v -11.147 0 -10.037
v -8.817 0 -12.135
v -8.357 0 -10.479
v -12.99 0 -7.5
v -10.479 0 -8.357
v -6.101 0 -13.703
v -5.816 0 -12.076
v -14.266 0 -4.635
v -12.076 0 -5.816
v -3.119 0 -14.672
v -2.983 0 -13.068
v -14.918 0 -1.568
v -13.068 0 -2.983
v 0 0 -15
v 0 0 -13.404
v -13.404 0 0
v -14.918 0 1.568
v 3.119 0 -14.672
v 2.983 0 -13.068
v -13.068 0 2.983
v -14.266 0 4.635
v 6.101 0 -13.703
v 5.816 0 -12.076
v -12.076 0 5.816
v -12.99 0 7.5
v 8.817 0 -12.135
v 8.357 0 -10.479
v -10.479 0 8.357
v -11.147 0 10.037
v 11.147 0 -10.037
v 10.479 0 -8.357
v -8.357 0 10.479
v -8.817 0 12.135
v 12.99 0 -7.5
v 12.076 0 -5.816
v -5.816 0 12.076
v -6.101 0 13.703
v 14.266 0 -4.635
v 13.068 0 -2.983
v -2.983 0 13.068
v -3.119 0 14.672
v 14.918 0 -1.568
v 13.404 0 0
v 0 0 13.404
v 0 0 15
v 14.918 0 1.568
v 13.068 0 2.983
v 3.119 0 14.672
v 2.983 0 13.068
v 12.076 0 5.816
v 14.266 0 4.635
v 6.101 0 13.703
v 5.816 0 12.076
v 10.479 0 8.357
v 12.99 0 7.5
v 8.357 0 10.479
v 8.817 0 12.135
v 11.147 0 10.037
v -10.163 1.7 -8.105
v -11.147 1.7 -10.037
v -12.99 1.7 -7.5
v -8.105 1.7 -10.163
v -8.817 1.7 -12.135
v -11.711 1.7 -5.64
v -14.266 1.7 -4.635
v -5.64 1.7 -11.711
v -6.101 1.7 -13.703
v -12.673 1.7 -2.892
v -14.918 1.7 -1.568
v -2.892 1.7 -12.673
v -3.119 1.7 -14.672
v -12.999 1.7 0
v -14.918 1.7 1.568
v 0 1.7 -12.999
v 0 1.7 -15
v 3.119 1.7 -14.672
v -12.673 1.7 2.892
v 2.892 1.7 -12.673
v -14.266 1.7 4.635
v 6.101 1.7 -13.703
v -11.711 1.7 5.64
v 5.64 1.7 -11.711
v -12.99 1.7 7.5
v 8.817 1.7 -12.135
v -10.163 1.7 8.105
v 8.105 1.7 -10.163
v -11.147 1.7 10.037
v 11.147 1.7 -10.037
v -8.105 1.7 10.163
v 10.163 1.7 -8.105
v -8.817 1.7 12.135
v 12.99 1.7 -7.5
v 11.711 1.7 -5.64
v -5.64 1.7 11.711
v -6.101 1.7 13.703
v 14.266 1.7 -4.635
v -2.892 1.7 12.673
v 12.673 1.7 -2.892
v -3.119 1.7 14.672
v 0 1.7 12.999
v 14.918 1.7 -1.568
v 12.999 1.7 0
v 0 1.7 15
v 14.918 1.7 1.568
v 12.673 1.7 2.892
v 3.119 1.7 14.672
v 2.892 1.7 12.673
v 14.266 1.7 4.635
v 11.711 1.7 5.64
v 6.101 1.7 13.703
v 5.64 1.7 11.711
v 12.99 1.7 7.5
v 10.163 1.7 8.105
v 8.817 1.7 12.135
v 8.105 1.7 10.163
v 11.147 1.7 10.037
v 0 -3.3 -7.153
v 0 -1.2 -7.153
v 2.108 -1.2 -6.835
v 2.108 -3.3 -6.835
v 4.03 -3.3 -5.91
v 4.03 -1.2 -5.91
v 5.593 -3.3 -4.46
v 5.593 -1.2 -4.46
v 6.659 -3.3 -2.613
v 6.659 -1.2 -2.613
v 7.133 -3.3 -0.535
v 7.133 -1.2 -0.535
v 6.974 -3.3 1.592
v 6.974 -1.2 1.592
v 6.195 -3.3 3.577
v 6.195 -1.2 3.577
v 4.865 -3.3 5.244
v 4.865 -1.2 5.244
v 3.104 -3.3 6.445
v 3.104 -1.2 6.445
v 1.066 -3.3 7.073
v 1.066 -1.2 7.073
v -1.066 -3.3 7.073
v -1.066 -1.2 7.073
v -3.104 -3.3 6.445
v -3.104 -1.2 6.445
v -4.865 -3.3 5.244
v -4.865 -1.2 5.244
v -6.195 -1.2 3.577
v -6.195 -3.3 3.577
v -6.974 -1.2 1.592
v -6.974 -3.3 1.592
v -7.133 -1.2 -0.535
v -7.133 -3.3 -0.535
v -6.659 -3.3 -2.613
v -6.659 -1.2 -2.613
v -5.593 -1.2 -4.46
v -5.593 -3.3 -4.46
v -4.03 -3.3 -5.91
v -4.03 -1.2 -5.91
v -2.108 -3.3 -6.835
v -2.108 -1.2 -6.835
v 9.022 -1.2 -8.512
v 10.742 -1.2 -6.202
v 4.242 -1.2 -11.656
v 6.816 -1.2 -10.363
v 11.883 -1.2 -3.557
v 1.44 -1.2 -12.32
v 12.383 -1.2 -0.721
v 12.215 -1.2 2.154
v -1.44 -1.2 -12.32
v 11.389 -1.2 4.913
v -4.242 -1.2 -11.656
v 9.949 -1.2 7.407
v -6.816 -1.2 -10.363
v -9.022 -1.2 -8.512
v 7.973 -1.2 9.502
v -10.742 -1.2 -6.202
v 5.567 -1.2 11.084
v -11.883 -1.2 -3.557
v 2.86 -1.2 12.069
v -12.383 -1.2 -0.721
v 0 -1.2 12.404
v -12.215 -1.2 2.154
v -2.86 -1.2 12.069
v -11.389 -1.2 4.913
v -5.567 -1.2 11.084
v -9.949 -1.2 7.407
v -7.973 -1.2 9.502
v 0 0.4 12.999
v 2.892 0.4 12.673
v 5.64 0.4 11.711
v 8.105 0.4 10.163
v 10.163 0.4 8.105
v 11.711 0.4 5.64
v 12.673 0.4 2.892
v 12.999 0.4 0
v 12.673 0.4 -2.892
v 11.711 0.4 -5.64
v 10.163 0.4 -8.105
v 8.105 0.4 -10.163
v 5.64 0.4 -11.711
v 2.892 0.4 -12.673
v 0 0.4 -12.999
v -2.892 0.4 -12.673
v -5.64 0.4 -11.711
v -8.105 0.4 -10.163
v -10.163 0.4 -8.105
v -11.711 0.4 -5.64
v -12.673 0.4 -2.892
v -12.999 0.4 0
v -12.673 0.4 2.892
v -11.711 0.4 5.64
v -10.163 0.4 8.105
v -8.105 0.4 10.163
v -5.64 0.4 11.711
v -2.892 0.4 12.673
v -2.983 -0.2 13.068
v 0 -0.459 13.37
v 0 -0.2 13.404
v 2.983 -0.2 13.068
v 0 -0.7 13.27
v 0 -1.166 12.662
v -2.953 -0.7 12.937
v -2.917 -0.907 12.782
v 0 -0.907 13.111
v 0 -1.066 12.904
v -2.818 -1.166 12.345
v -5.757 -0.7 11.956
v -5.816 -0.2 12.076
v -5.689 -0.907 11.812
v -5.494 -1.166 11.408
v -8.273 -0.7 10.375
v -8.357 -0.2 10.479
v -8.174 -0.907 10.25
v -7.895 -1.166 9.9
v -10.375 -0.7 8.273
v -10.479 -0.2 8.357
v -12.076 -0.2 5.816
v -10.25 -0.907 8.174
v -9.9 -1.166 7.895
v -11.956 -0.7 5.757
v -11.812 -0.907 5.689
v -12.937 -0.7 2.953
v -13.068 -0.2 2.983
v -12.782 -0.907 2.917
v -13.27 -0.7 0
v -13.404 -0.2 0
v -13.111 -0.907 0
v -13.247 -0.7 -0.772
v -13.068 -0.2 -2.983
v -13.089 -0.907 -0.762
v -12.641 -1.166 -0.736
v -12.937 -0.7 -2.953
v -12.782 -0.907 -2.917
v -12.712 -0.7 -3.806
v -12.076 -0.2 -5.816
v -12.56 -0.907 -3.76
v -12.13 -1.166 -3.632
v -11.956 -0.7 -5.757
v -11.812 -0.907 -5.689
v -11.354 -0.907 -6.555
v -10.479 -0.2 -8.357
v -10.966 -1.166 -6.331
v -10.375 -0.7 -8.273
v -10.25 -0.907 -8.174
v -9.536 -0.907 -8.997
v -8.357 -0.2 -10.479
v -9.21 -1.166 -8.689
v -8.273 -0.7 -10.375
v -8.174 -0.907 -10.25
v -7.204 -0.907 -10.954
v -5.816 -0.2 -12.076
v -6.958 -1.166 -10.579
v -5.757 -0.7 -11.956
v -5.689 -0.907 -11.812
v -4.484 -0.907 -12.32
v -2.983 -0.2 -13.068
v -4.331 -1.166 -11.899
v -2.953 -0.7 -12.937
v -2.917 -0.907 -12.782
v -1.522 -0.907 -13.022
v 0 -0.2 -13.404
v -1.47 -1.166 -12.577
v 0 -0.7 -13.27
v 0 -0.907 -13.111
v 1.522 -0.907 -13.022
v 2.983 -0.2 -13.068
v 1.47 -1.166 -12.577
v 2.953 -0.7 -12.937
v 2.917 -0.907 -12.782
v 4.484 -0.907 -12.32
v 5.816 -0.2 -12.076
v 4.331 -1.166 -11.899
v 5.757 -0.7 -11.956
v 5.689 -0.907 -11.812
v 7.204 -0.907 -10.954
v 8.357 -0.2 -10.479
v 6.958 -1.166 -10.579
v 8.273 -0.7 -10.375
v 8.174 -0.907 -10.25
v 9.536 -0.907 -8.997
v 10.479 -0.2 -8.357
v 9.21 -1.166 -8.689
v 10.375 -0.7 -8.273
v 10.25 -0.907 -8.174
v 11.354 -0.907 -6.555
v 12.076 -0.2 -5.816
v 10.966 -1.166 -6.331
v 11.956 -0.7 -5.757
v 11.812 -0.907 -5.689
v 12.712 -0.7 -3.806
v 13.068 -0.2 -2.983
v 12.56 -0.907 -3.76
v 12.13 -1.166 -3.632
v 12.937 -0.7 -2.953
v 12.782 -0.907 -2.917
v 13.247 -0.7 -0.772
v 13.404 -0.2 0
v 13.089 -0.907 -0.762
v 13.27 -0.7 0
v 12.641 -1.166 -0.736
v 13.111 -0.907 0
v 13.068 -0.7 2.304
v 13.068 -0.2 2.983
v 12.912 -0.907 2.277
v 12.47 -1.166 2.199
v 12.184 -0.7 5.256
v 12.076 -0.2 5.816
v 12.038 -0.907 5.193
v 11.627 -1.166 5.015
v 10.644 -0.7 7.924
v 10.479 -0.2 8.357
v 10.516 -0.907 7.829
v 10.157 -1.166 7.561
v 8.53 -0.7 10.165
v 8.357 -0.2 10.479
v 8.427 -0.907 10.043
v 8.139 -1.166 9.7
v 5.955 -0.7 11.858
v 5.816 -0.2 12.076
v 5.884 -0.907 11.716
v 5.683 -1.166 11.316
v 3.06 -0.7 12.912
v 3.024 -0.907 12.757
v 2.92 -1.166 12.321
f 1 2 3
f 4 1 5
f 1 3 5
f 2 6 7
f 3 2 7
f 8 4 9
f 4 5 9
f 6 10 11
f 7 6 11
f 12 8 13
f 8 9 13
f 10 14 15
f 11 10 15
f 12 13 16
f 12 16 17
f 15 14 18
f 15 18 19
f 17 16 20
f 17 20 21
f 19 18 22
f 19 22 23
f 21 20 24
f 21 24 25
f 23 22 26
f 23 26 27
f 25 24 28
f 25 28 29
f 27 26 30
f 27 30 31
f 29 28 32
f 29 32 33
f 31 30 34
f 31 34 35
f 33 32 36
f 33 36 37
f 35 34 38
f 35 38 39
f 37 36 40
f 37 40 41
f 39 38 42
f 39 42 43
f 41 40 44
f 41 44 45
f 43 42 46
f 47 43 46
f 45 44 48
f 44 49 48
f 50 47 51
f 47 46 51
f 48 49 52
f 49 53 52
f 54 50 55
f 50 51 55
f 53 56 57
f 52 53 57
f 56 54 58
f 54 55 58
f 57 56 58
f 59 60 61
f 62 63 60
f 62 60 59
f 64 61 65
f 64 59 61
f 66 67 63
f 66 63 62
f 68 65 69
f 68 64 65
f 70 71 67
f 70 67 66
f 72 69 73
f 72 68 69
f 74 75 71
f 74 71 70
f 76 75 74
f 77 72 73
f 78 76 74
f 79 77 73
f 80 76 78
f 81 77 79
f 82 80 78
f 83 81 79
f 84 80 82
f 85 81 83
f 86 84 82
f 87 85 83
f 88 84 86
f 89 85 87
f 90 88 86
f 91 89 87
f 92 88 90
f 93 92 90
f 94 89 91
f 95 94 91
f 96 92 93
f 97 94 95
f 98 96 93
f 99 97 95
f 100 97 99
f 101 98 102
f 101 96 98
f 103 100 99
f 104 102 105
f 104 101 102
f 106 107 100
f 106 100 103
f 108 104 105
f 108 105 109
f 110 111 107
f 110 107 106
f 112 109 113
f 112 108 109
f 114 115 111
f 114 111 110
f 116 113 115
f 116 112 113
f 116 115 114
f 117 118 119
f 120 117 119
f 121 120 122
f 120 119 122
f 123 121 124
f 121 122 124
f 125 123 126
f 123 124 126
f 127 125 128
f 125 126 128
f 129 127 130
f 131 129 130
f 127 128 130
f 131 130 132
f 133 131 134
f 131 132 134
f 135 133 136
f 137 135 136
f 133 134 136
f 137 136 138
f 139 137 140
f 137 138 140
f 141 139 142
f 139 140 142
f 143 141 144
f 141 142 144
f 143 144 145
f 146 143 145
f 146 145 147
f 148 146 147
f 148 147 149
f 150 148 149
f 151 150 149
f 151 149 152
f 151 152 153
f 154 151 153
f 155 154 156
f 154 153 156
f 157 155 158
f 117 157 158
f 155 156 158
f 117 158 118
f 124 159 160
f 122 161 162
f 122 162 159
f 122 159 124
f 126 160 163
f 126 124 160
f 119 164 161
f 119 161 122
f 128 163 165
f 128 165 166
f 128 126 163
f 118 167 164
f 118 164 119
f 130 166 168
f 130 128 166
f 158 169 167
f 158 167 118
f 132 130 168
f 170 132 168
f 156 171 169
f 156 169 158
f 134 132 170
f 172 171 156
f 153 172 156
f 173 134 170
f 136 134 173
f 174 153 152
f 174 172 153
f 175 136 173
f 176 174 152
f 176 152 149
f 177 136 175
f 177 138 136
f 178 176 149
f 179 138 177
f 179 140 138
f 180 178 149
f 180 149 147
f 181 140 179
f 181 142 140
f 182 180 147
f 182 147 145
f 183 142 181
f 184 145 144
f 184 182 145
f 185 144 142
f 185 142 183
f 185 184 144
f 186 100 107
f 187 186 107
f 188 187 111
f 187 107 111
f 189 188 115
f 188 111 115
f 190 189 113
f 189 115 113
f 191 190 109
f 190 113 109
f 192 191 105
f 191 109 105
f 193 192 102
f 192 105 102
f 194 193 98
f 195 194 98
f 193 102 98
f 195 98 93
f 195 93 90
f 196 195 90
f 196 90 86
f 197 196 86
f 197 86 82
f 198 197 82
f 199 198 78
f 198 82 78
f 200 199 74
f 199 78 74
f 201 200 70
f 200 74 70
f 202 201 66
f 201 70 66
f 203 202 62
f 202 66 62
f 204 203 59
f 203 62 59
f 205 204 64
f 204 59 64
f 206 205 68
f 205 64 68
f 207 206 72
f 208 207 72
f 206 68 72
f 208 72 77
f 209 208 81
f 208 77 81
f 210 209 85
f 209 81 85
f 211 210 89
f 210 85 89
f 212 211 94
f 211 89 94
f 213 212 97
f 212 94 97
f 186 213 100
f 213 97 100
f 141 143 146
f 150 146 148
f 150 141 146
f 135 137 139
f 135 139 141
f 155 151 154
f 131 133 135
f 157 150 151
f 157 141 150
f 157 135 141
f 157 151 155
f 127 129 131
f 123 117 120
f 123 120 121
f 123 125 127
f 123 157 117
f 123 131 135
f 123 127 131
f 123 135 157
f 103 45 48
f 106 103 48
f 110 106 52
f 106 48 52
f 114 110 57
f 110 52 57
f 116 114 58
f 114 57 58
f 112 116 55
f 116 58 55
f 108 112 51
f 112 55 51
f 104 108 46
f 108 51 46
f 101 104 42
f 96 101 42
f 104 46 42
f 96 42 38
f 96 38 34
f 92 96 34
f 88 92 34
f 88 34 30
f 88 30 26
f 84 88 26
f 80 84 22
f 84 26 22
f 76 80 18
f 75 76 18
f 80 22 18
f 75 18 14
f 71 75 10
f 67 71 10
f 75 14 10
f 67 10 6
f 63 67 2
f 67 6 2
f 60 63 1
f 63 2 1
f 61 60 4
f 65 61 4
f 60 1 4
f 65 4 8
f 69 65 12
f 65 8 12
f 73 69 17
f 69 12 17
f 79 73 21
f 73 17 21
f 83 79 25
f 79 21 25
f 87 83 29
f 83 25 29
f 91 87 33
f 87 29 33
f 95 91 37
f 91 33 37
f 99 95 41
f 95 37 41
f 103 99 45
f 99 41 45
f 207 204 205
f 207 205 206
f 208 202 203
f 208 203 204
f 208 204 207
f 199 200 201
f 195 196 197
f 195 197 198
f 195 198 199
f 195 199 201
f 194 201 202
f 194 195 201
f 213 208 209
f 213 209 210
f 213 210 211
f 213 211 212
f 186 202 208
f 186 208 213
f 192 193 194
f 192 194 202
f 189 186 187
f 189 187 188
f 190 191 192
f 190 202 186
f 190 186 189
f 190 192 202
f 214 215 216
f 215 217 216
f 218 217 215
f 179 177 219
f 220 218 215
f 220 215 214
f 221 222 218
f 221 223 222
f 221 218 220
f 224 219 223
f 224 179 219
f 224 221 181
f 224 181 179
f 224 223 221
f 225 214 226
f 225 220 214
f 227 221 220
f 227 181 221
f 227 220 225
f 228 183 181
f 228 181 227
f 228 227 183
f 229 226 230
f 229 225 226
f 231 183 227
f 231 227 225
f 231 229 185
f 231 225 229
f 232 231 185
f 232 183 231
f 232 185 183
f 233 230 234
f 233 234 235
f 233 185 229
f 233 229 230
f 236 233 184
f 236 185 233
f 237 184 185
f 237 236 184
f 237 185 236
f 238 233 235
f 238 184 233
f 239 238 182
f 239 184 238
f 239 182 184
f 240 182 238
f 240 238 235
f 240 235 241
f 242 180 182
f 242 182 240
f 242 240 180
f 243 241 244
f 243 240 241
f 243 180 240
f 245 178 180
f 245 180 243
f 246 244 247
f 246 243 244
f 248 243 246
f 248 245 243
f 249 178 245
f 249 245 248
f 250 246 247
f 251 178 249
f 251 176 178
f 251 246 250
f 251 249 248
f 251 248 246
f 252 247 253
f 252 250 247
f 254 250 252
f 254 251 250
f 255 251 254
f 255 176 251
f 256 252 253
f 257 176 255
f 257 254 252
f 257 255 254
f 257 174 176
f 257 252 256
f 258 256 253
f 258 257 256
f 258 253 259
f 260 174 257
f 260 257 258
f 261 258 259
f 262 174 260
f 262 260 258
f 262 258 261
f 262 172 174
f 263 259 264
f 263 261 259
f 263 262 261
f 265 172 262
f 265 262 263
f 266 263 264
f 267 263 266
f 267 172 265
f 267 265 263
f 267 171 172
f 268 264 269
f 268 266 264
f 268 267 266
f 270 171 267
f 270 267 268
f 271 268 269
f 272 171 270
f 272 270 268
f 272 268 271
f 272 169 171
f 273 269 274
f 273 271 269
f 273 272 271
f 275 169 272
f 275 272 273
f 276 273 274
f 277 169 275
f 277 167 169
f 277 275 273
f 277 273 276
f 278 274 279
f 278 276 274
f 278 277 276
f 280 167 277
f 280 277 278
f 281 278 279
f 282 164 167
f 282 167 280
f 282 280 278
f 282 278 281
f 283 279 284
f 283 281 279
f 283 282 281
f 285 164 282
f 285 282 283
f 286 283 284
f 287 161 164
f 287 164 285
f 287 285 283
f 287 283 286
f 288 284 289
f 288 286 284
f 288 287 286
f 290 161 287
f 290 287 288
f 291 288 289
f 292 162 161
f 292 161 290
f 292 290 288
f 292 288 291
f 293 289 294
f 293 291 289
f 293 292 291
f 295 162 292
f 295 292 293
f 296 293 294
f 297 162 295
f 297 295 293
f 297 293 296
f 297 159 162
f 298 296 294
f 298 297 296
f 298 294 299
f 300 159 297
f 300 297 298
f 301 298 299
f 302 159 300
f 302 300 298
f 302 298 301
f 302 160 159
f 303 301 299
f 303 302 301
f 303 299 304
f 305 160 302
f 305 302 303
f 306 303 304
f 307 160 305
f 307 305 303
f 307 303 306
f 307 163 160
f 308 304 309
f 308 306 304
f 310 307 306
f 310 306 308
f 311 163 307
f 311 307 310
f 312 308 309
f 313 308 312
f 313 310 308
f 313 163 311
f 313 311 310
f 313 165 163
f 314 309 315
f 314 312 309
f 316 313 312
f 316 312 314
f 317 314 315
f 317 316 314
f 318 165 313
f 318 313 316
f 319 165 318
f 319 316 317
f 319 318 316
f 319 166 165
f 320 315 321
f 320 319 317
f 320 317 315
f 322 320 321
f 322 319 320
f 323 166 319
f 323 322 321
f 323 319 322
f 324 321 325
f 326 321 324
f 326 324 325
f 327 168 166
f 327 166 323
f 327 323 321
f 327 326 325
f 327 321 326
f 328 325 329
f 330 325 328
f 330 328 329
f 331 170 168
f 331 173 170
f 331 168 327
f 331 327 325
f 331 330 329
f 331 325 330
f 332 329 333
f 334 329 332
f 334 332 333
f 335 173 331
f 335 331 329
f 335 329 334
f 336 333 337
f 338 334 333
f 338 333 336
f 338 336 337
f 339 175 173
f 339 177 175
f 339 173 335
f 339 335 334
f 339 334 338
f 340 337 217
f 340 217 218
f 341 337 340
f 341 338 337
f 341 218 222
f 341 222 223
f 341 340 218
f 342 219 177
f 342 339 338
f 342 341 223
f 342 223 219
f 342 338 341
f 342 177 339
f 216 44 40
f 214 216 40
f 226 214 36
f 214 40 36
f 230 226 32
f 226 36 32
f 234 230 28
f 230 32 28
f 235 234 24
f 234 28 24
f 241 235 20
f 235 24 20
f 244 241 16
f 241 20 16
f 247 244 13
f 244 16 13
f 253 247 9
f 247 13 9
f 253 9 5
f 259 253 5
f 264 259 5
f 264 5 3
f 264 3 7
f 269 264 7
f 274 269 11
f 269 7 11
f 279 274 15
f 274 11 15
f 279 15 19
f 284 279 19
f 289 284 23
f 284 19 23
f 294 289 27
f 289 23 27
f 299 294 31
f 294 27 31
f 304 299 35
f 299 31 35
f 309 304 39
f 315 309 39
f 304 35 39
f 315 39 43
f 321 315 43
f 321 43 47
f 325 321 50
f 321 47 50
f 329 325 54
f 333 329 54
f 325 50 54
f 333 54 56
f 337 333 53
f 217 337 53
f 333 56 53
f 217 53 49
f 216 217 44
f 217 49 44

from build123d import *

# Parameters (mm, degrees)
SKETCH_1_R          = 15
EXTRUDE_1_DEPTH     = 1.7
SKETCH_2_R          = 13.403606185
EXTRUDE_2_DEPTH     = 1.2
FILLET_1_R          = 1
SKETCH_4_R          = 7.153275754
EXTRUDE_3_DEPTH     = 2.1
SKETCH_6_R          = 12.998633497
CUT_EXTRUDE_4_DEPTH = 1.3


with BuildPart() as part:
    # Эскиз1 → Бобышка-Вытянуть1 (new body)
    with BuildSketch(Plane(origin=(0, 0, 0), x_dir=(1, 0, 0), z_dir=(0, 1, 0))):
        with Locations(Location((0, 0, 0), (0, 0, 270))):
            Circle(SKETCH_1_R)
    extrude(amount=EXTRUDE_1_DEPTH)

    # Эскиз2 → Бобышка-Вытянуть2 (add)
    with BuildSketch(Plane.XZ):
        with Locations(Location((0, 0, 0), (0, 0, 90))):
            Circle(SKETCH_2_R)
    extrude(amount=EXTRUDE_2_DEPTH)

    # Скругление1
    fillet_1_edges = [part.edges().sort_by_distance(p)[0] for p in [
        (0, -1.2, -13.403606185),
    ]]
    fillet(fillet_1_edges, radius=FILLET_1_R)

    # Эскиз4 → Бобышка-Вытянуть3 (add)
    with BuildSketch(Plane.XZ.offset(1.2)):
        with Locations(Location((0, 0, 0), (0, 0, 270))):
            Circle(SKETCH_4_R)
    extrude(amount=EXTRUDE_3_DEPTH)

    # Эскиз6 → Вырез-Вытянуть4 (cut)
    with BuildSketch(Plane(origin=(0, 1.7, 0), x_dir=(1, 0, 0), z_dir=(0, 1, 0))):
        with Locations(Location((0, 0, 0), (0, 0, 270))):
            Circle(SKETCH_6_R)
    extrude(amount=-CUT_EXTRUDE_4_DEPTH, mode=Mode.SUBTRACT)


solid = part.part
